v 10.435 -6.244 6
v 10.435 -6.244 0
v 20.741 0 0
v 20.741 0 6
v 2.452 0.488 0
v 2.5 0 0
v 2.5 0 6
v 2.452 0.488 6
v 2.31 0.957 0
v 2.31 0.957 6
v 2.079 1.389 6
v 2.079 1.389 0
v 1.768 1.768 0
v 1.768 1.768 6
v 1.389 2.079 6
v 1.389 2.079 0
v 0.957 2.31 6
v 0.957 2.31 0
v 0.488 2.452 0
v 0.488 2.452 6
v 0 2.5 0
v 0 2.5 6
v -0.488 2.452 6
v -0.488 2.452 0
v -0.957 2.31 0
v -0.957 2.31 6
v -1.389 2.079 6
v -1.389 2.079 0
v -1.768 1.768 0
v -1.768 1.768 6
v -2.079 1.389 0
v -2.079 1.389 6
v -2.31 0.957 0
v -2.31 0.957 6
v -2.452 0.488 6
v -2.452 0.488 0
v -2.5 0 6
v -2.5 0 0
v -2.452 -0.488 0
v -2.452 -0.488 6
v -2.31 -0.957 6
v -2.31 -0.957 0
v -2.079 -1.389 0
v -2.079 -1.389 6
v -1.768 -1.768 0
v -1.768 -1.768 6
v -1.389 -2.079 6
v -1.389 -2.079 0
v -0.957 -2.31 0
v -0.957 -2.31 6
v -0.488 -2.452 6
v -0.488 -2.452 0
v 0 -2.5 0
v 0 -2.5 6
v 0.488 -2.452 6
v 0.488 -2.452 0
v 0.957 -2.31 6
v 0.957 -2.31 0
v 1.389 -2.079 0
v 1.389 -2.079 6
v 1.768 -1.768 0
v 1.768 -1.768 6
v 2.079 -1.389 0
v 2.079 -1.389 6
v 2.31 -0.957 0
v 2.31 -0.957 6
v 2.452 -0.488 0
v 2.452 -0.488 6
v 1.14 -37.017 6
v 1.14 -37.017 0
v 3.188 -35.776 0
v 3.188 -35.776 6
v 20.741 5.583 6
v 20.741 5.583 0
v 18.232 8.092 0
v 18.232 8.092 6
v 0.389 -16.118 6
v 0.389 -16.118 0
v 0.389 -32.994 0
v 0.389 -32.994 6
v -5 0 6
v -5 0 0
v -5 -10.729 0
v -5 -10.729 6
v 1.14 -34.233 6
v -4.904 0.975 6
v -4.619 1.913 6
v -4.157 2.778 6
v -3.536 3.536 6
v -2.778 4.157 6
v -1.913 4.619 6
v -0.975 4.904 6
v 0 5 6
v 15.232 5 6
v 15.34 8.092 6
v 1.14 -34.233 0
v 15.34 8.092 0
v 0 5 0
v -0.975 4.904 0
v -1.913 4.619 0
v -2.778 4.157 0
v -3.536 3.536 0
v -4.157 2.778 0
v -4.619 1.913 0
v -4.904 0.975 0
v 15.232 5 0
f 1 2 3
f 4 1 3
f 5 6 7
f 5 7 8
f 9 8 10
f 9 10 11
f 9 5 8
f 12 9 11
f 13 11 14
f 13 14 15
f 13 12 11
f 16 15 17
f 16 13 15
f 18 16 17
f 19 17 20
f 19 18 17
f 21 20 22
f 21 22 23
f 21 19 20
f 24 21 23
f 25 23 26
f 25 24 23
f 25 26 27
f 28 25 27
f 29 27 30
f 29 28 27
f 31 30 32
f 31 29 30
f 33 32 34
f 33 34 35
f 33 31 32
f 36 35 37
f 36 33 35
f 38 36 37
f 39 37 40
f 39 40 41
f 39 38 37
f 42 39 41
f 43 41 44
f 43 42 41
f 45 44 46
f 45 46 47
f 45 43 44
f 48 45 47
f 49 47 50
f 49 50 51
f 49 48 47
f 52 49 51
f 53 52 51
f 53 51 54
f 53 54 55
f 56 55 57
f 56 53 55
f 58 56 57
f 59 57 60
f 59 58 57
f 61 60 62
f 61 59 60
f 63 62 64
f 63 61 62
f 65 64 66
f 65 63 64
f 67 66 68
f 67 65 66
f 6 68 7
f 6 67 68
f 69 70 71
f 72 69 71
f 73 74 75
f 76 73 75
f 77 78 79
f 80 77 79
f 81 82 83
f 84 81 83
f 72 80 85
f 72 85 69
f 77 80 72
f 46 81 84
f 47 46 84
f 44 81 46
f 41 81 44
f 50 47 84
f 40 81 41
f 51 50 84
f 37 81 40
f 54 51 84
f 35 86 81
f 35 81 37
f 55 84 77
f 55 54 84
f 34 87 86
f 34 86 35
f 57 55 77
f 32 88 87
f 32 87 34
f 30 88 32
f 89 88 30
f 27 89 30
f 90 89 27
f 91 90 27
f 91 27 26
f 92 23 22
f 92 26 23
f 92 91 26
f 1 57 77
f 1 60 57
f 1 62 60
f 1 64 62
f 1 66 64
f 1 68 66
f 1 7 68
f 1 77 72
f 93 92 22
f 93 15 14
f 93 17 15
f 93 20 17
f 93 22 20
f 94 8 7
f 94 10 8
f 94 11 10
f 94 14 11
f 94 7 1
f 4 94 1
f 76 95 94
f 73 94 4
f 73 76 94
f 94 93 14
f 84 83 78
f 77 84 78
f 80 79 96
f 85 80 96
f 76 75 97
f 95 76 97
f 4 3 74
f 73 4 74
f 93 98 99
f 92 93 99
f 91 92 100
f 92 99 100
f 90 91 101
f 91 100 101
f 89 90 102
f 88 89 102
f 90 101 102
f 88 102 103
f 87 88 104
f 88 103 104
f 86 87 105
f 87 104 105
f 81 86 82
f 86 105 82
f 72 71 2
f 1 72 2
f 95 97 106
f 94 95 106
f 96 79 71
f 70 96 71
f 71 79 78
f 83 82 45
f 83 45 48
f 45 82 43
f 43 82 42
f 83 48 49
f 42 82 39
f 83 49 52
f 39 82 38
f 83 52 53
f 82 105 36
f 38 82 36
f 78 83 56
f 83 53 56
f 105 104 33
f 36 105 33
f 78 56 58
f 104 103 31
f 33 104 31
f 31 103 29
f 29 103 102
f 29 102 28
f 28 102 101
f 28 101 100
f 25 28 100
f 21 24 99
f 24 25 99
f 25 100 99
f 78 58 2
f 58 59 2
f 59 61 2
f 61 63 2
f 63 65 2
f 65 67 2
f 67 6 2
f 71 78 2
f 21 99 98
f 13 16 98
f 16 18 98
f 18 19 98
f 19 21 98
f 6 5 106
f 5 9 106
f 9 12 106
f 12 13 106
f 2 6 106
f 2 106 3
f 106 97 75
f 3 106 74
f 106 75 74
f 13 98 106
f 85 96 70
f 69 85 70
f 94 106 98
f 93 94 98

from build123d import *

# Parameters (mm, degrees)
SKETCH_1_R      = 5
SKETCH_1_R_2    = 2.5
EXTRUDE_1_DEPTH = 6


with BuildPart() as part:
    # 스케치1 → 보스-돌출1 (new body)
    # profile 1 of 2: a face of its own
    with BuildSketch(Plane.XY):
        Circle(SKETCH_1_R)
        Circle(SKETCH_1_R_2, mode=Mode.SUBTRACT)
    # profile 2 of 2: a face of its own
    with BuildSketch(Plane.XY):
        with BuildLine():
            Line((15.232380882, 5), (0, 5))
            ThreePointArc((0, 5), (3.535533906, 3.535533906), (5, 0))
            ThreePointArc((5, 0), (0, -5), (-5, 0))
            Line((-5, 0), (-5, -10.728628998))
            Line((-5, -10.728628998), (0.389281966, -16.117910964))
            Line((0.389281966, -16.117910964), (0.389281966, -32.993510276))
            Line((0.389281966, -32.993510276), (1.140402407, -34.2331528))
            Line((1.140402407, -34.2331528), (1.140402407, -37.017391391))
            Line((1.140402407, -37.017391391), (3.188469753, -35.776432632))
            Line((3.188469753, -35.776432632), (10.435477501, -6.24434983))
            Line((10.435477501, -6.24434983), (20.74109717, 0))
            Line((20.74109717, 0), (20.74109717, 5.58326458))
            Line((20.74109717, 5.58326458), (18.231984896, 8.092376853))
            Line((18.231984896, 8.092376853), (15.340369062, 8.092376853))
            Line((15.340369062, 8.092376853), (15.232380882, 5))
        make_face()
    extrude(amount=EXTRUDE_1_DEPTH)


solid = part.part
